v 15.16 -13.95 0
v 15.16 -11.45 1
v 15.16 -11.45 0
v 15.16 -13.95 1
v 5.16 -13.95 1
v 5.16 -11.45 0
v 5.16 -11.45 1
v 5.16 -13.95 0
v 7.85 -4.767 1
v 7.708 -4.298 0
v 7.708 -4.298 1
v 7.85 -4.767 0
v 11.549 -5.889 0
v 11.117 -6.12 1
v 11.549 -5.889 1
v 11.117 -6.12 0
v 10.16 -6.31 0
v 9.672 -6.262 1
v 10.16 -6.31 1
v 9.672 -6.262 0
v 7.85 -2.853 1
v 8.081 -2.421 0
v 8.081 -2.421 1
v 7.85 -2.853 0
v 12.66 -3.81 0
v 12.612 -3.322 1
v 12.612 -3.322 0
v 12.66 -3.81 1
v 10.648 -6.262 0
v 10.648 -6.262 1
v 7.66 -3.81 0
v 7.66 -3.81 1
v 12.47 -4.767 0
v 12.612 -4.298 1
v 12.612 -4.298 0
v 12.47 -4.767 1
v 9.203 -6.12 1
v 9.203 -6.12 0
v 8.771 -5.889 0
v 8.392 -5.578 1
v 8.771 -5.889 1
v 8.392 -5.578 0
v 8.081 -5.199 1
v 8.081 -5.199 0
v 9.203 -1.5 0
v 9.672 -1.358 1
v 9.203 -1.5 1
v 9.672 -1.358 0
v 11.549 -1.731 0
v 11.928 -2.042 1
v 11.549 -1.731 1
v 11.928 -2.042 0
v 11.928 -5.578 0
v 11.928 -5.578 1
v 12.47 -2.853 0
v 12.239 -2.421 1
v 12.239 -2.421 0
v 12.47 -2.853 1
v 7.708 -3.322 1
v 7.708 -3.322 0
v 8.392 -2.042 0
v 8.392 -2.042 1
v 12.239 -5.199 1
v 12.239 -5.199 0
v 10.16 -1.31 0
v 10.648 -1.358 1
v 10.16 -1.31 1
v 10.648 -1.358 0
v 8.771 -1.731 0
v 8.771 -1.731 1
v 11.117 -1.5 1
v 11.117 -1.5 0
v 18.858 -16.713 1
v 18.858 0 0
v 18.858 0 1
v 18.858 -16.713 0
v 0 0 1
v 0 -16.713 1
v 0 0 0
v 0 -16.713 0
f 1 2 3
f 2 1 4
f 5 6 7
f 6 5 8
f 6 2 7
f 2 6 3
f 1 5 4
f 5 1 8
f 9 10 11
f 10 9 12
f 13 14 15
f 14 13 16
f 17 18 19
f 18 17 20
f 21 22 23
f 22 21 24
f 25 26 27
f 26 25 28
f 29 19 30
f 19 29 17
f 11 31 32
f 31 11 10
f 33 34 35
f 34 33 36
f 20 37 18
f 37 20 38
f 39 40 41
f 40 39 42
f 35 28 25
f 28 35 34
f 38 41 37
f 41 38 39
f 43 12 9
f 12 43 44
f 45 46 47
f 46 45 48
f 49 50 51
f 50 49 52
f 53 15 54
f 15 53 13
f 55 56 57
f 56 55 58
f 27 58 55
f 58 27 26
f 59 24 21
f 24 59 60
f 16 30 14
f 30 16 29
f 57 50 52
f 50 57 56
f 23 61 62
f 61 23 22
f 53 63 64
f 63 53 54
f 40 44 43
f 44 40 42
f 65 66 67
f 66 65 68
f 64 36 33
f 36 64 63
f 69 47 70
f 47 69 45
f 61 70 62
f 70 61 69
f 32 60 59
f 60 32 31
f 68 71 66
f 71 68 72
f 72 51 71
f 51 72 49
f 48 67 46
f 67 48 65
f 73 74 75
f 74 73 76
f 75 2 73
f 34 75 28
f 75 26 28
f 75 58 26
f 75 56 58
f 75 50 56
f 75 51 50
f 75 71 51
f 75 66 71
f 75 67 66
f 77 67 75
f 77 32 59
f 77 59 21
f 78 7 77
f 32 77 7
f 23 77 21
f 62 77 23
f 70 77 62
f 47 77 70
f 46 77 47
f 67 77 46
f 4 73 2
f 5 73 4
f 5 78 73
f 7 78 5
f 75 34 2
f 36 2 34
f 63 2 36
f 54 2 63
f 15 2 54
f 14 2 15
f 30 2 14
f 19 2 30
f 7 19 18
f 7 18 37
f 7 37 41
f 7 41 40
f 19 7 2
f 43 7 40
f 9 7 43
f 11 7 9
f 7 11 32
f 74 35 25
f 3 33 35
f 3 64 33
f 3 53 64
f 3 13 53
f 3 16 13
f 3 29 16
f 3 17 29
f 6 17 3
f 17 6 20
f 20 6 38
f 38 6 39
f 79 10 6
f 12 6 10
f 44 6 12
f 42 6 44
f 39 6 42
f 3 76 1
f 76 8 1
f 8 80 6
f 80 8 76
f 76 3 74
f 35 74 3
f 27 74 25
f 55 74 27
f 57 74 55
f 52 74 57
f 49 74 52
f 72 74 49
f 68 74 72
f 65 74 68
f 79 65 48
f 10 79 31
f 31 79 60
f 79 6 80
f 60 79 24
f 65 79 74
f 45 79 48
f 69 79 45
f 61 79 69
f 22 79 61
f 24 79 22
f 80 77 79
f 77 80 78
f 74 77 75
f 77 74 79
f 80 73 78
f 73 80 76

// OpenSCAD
/**
 * @filename: switch_and_led.model.scad
 * @module-dependency: switch_and_led
 * 
 */
$fa=0.5; // default minimum facet angle is now 0.5
$fs=0.5; // default minimum facet size is now 0.5 mm

/** !!!!! DUMMY ENTITY !!!!! */
commonLegLength = (5); /* Origin: None */

/** !!!!! DUMMY ENTITY !!!!! */
commonLegDiameter = (.4); /* Origin: None */

// ------ INCLUDED/USED ------
//include <switch_and_led.model.lib.scad>
// ---------------------------
    /** @filename: 	switch_and_led.model.lib.scad */
    
    
    
    /** !!!!! DUMMY ENTITY !!!!! */
    module mResistorModuleID(){/* Origin: None */
    
    }
    
    /** !!!!! DUMMY ENTITY !!!!! */
    module mTwoLayerRectanglePCBModuleID(){/* Origin: None */
    
    }
    
    /**
     * A 5mm LED. Drill Only Version.
     * @uri: 	https://github.com/htho/fzz2scad-lib/lib/electronic_components/active/semiconductors/diodes/leds/standard5mm.scad
     * @note: 	fzz2scad-compatible, see https://github.com/htho/fzz2scad
     * @license: 	This work is licensed under the Creative Commons
     * Attribution-ShareAlike 4.0 International License.
     * To view a copy of this license, visit
     * http://creativecommons.org/licenses/by-sa/4.0/.
     * @license-short: 	cc-by-sa-4.0
     * @category-list: 	electronic_component, active, semiconductor, led
     * @license-link: 	http://creativecommons.org/licenses/by-sa/4.0/
     * @param: distanceFromPCB 	Sometimes the LED does not touch the pcb.
     * @param: drillDepth 	The depth of the drill for this part.
     * @version: 	0.1
     * @author: 	Hauke Thorenz <htho@thorenz.net>
     * @tag-list: 	led, 5mm, do, fzz2scad-compatible
     * @source: 	https://cdn-reichelt.de/documents/datenblatt/A500/LED_5MM_GE.pdf
     * @source: 	https://github.com/fritzing/fritzing-parts/blob/master/svg/core/pcb/5mm_LED.svg
     */
    module led5mm_do(drillDepth, distanceFromPCB=0){/* Origin: '../../../scadlib-electronic-components/active/semiconductors/diodes/leds/standard5mm.scad'(100:1) */
        
          rm = 2.54;
          dCyl = 5;
        
          translate([0,0,distanceFromPCB]) //moving according to distanceFromPCB
          rotate([0,0,90]){ //rotating it so the flat edge is on the "upper" side (2D) which is the "back" side in 3D
            translate([-(rm/2),0,0]){ //Translating so the center is on connector0
              cylinder(h=drillDepth, d=dCyl); //create the object.
            }
          }
    }
    
    /**
     * ESP10XX a slide switch. Drill Only Version.
     * @uri: 	https://github.com/htho/fzz2scad-lib/lib/electronic_components/electromechanical/switches/switches/SPDT/ESP10XX.scad
     * @note: 	fzz2scad-compatible, see https://github.com/htho/fzz2scad
     * @note: 	THIS IS NOT THE FRITZINGS STANDARD SPDT SWITCH! It is pin
     * compatible but slightly bigger and has a different slide mechanism.
     * @license: 	This work is licensed under the Creative Commons
     * Attribution-ShareAlike 4.0 International License.
     * To view a copy of this license, visit
     * http://creativecommons.org/licenses/by-sa/4.0/.
     * @license-short: 	cc-by-sa-4.0
     * @category-list: 	electronic_component, electromechanical, switch, SPDT
     * @license-link: 	http://creativecommons.org/licenses/by-sa/4.0/
     * @param: drillDepth 	The depth of the drill for this part.
     * @version: 	0.1
     * @author: 	Hauke Thorenz <htho@thorenz.net>
     * @tag-list: 	SPDT, slide switch, fzz2scad-compatible, do
     * @source: 	https://cdn-reichelt.de/documents/datenblatt/C200/DS_ESP_SERIE.pdf
     * @source: 	https://github.com/sparkfun/Pro_Micro/blob/master/Hardware/Pro_Micro.brd
     * @source: 	https://github.com/fritzing/fritzing-parts/blob/master/svg/core/pcb/jumper_3_100mil.svg
     * @manufacturer-product: 	ESP10XX
     * @manufacturer: 	EXCEL CELL ELECTRONIC
     */
    module ESP10XX_do(drillDepth){/* Origin: '../../../scadlib-electronic-components/electromechanical/switches/switches/SPDT/ESP10XX.scad'(145:1) */
        
          rm = 2.54;
          widthSocket=10;
          depthSocket=2.5;  
          rotate([0,0,-90]){ //rotating it so the orientation fits the Fritzing part 
            translate([rm,0,0]){ //Translating so the center is on connector0
              translate([0,0,drillDepth/2]) cube([widthSocket, depthSocket, drillDepth], true); //body
            }
          }
    }
// ---------------------------

// ------ INCLUDED/USED ------
//include <switch_and_led.mapping.scad>
// ---------------------------
    /** @filename: 	switch_and_led.mapping.scad */
    
    
    
    /**
     * A Mapping from 'm5mmColorLEDModuleID' to 'led5mm_do'
     * @module-dependency: led5mm_do 	
     * @argument: 	drillDepth
     * @argument: 	distanceFromPCB
     */
    module m5mmColorLEDModuleID(drillDepth, distanceFromPCB){/* Origin: None */
        led5mm_do(drillDepth=drillDepth, distanceFromPCB=distanceFromPCB);
    }
    
    /**
     * A Mapping from 'm1238DBDC00_toggle_switch' to 'ESP10XX_do'
     * @module-dependency: ESP10XX_do 	
     * @argument: 	drillDepth
     */
    module m1238DBDC00_toggle_switch(drillDepth){/* Origin: None */
        ESP10XX_do(drillDepth=drillDepth);
    }
// ---------------------------

// ------ INCLUDED/USED ------
//include <switch_and_led.scad>
// ---------------------------
    /**
     * @filename: switch_and_led.scad
     * @created-with: fzz2scad v0.1 (https://github.com/htho/fzz2scad)
     */
    
    /**
     * 
     * @created-with: fzz2scad v0.1 (https://github.com/htho/fzz2scad)
     * @module-dependency: m1238DBDC00_toggle_switch
     * @module-dependency: m5mmColorLEDModuleID
     * @module-dependency: mResistorModuleID
     * @module-dependency: mTwoLayerRectanglePCBModuleID
     */
    module switch_and_led(){
        {
            // PCB: module_name: 'mTwoLayerRectanglePCBModuleID', moduleIdRef: 'TwoLayerRectanglePCBModuleID', title: 'PCB', attributes: '{}', params: 'pcbHeight=1.2,width=18.8579,depth=16.7126'
            translate([0.03167069555555555,-0.0,0]) //position
            {
                mTwoLayerRectanglePCBModuleID(pcbHeight=1.2,width=18.8579,depth=16.7126);
            }
            
            
            // Part: module_name: 'm1238DBDC00_toggle_switch', moduleIdRef: '1238DBDC00-toggle-switch', title: 'SWITCH'
            translate([8.382,-8.382,0]) //position on the PCB
            multmatrix(m=[
                [ 0         , -1        , 0         , -2.54     ],
                [ 1         , 0         , 0         , -6.096    ],
                [ 0         , 0         , 1         , 0         ],
                [ 0         , 0         , 0         , 1         ]
            ]) //rotation and translation
            {
                 translate([1.778,-1.778,0]) m1238DBDC00_toggle_switch(drillDepth=50.0); 
            }
            
            
            // Part: module_name: 'm5mmColorLEDModuleID', moduleIdRef: '5mmColorLEDModuleID', title: 'LED'
            translate([7.059929999999999,-0.1309511111111111,0]) //position on the PCB
            multmatrix(m=[
                [ -1        , 0         , 0         , 6.20014   ],
                [ 0         , -1        , 0         , -6.20014  ],
                [ 0         , 0         , 1         , 0         ],
                [ 0         , 0         , 0         , 1         ]
            ]) //rotation and translation
            {
                 translate([3.10007,-1.251091111111111,0]) m5mmColorLEDModuleID(distanceFromPCB=0.9999999999999999,drillDepth=50.0); 
            }
            
            
            // Part: module_name: 'mResistorModuleID', moduleIdRef: 'ResistorModuleID', title: 'R1'
            translate([9.2075,-6.5278,0]) //position on the PCB
            multmatrix(m=[
                [ 0         , -1        , 0         , 4.940299999999999],
                [ 1         , 0         , 0         , -7.124700000000001],
                [ 0         , 0         , 1         , 0         ],
                [ 0         , 0         , 0         , 1         ]
            ]) //rotation and translation
            {
                 translate([0.9524999999999999,-1.0921999999999998,0]) mResistorModuleID(); 
            }
        }
    }
// ---------------------------


difference(){
  translate([0,-16.7126,0]) cube([18.8579, 16.7126, 1]);
  translate([0,0,-5]) switch_and_led();
}
